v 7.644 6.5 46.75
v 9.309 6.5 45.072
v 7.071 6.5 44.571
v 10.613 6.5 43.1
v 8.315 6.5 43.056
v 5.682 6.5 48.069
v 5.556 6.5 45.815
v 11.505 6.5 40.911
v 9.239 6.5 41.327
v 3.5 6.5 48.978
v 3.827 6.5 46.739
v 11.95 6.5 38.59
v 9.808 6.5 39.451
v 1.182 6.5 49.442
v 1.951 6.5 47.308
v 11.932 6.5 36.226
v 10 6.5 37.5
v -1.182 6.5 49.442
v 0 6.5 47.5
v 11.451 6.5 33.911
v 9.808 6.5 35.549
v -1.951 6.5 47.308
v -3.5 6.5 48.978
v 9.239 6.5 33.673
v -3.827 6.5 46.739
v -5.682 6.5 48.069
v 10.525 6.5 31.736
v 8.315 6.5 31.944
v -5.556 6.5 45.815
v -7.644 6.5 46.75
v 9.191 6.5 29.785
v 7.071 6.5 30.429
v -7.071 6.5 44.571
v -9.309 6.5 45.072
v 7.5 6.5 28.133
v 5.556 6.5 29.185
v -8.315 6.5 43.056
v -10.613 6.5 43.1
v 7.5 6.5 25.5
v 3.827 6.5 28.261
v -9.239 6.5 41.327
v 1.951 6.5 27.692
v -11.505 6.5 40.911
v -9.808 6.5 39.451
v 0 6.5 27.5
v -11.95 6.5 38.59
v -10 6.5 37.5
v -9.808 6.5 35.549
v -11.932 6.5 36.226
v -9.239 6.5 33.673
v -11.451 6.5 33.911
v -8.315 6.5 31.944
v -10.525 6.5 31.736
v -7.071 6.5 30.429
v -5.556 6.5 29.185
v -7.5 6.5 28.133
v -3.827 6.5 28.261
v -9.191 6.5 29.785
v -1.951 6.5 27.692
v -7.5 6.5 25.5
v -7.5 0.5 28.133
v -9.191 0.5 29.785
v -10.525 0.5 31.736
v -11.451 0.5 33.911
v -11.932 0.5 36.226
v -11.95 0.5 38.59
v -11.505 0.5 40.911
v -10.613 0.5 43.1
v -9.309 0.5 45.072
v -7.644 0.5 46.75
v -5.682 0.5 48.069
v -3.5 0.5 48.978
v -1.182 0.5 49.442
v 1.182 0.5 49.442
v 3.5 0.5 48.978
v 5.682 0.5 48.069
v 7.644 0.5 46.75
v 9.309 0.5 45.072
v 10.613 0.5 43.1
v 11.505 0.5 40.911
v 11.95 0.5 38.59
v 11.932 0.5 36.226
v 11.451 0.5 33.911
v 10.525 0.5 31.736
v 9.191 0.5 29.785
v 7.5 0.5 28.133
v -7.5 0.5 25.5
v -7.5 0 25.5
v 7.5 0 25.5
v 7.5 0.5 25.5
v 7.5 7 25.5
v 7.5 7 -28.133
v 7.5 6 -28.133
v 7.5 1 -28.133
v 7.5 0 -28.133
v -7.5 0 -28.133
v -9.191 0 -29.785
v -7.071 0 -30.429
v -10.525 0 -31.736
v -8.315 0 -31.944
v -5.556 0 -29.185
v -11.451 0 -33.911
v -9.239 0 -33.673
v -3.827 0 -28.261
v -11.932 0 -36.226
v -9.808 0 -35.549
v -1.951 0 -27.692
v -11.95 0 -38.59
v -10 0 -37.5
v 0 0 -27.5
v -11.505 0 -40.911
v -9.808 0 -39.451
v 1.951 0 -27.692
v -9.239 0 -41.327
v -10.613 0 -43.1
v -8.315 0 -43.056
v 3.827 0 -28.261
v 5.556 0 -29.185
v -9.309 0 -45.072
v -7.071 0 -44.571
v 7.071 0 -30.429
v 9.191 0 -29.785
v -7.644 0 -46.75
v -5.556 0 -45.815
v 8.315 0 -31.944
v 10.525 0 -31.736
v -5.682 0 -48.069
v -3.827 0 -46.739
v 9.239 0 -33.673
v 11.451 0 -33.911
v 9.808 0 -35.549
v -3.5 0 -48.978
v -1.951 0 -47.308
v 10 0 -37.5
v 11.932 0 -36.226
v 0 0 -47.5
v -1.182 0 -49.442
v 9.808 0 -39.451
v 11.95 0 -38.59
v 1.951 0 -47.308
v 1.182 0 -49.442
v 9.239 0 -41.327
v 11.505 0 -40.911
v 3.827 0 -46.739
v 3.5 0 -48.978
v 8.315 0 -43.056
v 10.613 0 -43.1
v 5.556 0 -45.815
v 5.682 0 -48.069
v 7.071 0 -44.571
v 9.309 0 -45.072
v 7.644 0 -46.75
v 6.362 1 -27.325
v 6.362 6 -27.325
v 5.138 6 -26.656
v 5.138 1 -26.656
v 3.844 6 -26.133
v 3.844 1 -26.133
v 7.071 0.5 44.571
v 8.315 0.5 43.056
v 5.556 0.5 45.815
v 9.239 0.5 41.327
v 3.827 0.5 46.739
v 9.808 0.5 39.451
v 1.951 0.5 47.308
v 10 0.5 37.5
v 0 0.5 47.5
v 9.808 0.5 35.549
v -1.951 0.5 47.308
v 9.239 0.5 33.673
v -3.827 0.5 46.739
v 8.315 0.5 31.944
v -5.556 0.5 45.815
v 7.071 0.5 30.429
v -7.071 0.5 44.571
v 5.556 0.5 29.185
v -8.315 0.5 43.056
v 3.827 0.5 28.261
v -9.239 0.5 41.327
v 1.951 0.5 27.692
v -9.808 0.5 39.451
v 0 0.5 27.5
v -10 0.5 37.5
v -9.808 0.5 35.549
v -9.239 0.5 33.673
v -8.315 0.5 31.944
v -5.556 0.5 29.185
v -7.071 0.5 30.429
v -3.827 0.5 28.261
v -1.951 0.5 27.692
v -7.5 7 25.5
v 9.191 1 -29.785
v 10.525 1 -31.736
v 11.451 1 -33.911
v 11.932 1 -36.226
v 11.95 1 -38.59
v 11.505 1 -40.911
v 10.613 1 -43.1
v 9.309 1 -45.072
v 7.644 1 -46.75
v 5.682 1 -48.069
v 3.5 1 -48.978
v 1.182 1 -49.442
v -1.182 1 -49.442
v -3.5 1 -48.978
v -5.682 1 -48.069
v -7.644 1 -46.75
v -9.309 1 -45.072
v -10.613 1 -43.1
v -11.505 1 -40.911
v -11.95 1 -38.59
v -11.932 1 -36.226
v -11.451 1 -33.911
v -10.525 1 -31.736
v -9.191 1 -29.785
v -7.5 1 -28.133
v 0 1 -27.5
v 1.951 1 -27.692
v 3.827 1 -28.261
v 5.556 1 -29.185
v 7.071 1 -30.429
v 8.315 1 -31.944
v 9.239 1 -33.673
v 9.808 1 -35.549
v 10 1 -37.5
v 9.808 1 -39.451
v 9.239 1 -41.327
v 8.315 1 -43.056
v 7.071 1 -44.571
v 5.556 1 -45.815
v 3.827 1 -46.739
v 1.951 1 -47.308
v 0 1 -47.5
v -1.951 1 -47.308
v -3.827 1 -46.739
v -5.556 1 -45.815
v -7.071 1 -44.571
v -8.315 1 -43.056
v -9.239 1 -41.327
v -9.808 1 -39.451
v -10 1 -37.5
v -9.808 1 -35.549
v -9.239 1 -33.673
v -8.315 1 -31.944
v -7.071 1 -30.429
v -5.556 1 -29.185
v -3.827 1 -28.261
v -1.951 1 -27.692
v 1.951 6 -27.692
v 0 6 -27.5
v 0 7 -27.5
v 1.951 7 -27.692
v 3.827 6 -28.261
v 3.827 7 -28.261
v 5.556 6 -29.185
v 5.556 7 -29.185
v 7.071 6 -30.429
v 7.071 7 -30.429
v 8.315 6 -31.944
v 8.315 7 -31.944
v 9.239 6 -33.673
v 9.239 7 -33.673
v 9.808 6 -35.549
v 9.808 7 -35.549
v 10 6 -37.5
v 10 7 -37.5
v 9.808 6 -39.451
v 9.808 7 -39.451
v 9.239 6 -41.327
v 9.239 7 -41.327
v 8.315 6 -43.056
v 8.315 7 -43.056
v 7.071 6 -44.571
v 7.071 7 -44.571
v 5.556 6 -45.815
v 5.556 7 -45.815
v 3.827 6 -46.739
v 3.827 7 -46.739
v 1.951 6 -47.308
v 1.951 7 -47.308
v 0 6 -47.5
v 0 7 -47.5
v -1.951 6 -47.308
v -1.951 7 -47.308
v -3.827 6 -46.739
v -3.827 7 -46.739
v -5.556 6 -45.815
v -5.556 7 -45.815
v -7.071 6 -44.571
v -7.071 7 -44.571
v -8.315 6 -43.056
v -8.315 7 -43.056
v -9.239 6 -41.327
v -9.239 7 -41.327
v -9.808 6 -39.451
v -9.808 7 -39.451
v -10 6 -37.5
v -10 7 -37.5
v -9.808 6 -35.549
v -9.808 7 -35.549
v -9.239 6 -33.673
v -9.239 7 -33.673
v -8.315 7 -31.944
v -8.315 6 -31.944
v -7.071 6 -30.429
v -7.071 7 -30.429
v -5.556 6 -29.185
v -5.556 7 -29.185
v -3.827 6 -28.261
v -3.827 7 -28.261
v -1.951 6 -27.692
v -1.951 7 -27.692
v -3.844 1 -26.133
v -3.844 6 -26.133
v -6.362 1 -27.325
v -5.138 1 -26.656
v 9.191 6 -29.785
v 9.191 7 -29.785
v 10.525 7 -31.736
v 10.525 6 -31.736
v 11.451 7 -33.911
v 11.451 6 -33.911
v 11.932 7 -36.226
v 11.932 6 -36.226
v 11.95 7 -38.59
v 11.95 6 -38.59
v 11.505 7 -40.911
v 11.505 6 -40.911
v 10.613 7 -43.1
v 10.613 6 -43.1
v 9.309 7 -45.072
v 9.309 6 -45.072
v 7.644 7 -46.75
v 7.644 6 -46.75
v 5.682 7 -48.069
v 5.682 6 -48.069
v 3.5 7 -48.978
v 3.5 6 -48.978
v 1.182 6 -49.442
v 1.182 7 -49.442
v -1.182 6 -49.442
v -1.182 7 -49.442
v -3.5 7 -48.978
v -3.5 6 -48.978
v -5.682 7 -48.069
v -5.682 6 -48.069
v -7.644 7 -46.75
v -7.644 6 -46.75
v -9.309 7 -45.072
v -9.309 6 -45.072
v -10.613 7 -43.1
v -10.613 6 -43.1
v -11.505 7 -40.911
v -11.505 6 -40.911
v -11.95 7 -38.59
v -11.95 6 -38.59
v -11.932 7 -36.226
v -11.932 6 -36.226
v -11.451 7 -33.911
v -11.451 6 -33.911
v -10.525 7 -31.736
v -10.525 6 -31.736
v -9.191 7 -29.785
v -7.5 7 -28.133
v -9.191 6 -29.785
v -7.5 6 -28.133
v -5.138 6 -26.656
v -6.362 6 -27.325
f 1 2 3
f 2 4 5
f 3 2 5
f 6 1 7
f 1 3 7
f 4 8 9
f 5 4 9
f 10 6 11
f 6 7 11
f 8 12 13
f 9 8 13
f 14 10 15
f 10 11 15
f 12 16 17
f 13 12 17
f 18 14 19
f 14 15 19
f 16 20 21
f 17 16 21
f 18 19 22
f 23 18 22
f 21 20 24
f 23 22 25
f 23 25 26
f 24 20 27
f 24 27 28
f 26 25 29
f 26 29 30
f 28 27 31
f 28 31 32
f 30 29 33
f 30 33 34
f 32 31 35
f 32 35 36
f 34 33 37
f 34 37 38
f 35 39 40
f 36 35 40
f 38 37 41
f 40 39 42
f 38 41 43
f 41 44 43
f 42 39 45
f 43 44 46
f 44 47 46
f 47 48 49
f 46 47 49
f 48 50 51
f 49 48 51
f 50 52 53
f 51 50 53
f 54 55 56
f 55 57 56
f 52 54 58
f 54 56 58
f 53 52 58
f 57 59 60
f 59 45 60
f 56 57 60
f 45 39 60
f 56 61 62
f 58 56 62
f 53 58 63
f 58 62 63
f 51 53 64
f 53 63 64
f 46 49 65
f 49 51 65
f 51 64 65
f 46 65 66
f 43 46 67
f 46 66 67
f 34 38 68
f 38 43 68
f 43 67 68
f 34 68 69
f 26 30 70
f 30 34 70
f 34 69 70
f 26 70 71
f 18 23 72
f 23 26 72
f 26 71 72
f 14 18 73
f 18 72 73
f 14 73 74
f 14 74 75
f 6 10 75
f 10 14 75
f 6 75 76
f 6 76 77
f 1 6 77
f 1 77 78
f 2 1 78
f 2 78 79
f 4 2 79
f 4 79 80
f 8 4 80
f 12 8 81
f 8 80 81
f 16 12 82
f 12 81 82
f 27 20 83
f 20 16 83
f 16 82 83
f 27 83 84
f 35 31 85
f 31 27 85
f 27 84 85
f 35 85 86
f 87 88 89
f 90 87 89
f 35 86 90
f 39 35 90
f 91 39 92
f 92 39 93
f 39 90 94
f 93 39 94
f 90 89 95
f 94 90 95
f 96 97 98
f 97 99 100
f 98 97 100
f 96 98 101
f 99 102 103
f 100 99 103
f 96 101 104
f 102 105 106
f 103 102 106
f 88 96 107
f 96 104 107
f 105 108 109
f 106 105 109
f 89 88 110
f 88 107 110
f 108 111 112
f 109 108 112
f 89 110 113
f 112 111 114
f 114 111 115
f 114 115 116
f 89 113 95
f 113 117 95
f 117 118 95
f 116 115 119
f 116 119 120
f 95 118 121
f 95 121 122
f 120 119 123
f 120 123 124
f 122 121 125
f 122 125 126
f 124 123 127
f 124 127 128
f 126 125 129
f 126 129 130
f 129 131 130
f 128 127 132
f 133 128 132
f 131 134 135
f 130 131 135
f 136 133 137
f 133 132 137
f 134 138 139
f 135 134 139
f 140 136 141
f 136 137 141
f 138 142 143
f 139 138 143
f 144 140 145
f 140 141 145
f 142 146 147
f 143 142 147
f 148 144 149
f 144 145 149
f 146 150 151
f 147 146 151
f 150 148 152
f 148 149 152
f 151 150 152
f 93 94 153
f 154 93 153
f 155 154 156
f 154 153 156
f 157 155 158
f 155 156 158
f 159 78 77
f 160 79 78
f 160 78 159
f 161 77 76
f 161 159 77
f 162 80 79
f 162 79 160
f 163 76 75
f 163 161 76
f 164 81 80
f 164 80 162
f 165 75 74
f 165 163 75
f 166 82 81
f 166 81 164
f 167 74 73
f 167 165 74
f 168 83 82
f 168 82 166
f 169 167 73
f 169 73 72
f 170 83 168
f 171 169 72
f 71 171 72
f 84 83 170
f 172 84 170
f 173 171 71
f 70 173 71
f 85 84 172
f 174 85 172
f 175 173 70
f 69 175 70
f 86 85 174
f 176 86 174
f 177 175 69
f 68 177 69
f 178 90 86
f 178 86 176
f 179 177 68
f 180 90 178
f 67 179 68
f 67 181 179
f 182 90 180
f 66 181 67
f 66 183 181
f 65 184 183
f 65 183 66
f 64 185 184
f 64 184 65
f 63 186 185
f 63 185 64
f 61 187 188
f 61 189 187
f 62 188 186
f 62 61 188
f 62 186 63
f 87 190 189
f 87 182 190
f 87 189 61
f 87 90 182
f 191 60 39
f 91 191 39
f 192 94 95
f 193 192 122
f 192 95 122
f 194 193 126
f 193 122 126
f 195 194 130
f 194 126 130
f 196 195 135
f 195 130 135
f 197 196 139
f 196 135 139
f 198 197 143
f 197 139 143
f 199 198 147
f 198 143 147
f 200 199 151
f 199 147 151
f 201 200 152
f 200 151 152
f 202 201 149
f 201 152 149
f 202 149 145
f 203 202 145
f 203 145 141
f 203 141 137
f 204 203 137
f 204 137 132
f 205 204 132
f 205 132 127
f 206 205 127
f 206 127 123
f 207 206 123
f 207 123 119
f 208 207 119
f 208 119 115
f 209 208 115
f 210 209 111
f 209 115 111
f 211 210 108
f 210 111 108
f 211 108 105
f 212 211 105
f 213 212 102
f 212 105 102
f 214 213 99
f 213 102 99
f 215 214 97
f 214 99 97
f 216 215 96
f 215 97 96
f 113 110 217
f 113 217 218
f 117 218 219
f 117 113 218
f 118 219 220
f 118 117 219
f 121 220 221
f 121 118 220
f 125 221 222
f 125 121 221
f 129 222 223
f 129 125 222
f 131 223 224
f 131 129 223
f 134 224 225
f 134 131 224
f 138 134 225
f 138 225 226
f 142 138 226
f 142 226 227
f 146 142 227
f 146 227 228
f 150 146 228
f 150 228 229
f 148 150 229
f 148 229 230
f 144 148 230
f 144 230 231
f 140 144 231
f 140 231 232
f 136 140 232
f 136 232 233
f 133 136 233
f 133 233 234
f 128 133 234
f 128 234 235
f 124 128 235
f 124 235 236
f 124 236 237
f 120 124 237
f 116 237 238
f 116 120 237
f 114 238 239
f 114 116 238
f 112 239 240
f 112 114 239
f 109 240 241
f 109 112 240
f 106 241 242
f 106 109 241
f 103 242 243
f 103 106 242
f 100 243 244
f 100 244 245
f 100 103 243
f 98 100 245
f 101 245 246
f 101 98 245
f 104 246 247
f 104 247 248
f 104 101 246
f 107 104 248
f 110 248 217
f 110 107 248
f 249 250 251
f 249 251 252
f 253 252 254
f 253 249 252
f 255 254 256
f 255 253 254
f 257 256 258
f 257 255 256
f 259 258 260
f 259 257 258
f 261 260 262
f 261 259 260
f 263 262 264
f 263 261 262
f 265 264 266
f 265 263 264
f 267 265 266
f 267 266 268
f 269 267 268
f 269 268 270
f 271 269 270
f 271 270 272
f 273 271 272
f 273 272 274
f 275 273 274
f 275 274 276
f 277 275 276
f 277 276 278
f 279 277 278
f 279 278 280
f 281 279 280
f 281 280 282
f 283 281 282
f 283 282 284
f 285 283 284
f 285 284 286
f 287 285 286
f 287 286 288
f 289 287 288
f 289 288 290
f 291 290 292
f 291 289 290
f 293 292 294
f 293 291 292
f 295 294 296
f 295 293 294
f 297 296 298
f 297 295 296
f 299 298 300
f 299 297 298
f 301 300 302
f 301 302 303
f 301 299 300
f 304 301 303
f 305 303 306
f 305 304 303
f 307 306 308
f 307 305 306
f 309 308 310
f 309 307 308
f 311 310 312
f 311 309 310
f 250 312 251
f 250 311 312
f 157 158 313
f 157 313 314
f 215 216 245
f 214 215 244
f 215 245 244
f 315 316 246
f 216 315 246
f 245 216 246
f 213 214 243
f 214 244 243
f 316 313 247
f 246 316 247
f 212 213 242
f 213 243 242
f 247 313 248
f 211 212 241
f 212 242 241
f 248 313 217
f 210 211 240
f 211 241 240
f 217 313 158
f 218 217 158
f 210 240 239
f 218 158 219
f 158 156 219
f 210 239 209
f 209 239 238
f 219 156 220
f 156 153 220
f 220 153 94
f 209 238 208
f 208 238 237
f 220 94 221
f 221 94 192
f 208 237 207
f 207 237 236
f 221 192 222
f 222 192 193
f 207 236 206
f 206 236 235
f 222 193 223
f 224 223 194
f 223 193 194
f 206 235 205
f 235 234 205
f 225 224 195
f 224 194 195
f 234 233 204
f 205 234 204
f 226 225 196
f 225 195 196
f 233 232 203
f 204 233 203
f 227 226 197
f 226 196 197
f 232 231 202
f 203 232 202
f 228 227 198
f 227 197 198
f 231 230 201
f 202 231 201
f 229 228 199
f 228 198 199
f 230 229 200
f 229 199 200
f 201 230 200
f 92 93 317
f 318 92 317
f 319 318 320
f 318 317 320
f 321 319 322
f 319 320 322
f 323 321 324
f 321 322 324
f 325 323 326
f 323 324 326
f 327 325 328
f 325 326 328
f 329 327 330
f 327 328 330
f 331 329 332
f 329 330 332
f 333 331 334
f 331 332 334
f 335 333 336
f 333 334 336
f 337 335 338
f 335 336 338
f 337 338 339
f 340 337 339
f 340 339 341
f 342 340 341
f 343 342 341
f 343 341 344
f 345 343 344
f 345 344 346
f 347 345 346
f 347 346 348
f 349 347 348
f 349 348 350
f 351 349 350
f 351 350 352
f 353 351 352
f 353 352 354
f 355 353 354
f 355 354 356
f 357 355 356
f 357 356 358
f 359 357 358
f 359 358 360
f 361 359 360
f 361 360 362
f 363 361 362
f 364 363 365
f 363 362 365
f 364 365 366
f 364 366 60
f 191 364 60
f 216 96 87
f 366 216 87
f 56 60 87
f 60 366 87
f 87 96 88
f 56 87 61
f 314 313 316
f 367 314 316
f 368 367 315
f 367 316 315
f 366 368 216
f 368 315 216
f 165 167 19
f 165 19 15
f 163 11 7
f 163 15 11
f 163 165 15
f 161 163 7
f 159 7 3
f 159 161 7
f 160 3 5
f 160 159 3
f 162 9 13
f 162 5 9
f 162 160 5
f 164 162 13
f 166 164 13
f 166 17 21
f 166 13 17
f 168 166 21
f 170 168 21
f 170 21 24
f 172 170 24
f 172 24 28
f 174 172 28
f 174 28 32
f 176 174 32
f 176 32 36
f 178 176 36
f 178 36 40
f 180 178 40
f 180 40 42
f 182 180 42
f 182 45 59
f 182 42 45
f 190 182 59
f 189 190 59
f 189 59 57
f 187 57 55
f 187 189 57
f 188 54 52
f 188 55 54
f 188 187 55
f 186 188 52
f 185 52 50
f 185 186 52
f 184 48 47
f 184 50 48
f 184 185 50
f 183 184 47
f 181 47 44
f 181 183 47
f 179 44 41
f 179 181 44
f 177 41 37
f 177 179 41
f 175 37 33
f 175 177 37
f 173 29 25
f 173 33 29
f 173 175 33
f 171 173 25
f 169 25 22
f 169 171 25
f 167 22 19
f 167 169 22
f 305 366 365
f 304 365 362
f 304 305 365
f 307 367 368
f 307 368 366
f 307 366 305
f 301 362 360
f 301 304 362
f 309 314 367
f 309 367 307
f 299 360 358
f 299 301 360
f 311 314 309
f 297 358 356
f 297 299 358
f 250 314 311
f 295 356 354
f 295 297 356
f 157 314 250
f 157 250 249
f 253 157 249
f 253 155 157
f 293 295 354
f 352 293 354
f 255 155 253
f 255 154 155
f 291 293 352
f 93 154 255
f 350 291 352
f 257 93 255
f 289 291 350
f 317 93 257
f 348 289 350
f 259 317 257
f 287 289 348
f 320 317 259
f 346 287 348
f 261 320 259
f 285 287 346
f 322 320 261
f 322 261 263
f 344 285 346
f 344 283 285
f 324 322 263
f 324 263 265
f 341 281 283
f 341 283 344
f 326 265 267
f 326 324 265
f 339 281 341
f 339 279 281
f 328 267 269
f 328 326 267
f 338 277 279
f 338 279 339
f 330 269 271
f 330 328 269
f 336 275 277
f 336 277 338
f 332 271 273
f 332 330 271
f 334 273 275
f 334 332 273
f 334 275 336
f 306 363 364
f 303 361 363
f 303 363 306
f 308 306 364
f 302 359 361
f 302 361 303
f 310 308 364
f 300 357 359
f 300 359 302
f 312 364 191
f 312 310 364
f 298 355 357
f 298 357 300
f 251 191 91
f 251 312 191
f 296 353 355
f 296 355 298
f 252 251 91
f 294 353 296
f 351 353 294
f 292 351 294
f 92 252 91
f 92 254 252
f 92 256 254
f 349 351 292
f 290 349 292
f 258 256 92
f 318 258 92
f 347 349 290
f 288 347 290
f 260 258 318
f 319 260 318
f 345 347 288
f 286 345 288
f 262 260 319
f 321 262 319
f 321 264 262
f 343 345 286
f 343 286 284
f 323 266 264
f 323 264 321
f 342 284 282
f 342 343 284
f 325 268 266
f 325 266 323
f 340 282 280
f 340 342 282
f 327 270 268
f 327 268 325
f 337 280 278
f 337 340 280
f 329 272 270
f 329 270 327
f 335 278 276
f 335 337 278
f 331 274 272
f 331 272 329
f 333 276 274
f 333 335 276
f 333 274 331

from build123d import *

# Parameters (mm, degrees)
PROFILE_SKETCH_R                  = 10
PROFILE_EXTRUDE_DEPTH             = 7
UPPER_WRIST_CUT_DEPTH             = 0.5
LOWER_START                       = 6.5
LOWER_WRIST_CUT_DEPTH             = 0.5
FINGER_CUT_REACH                  = 53.413
FINGER_CUT_END_RADIUS             = 12
FINGER_CUT_SKETCH_W               = 23.367496998
FINGER_CUT_SKETCH_H               = 5
FINGER_CUT_DIRECTION_2_REACH      = 53.413
FINGER_CUT_DIRECTION_2_END_RADIUS = 12


with BuildPart() as part:
    # Profile Sketch → Profile Extrude (new body)
    with BuildSketch(Plane(origin=(0, 0, 0), x_dir=(1, 0, 0), z_dir=(0, 1, 0))):
        with BuildLine():
            Line((-7.5, 28.132503002), (-7.5, -28.132503002))
            ThreePointArc((-7.5, -28.132503002), (0, -49.5), (7.5, -28.132503002))
            Line((7.5, -28.132503002), (7.5, 28.132503002))
            ThreePointArc((7.5, 28.132503002), (0, 49.5), (-7.5, 28.132503002))
        make_face()
        with Locations(Location((0, -37.5, 0), (0, 0, 270))):
            Circle(PROFILE_SKETCH_R, mode=Mode.SUBTRACT)
        with Locations(Location((0, 37.5, 0), (0, 0, 270))):
            Circle(PROFILE_SKETCH_R, mode=Mode.SUBTRACT)
    extrude(amount=PROFILE_EXTRUDE_DEPTH)

    # Wrist Cut Sketch → Upper Wrist Cut (cut)
    with BuildSketch(Plane(origin=(0, 0, 0), x_dir=(1, 0, 0), z_dir=(0, 1, 0))):
        with BuildLine():
            Line((-7.5, -28.132503002), (-7.5, -25.5))
            Line((-7.5, -25.5), (7.5, -25.5))
            Line((7.5, -25.5), (7.5, -28.132503002))
            ThreePointArc((7.5, -28.132503002), (0, -49.5), (-7.5, -28.132503002))
        make_face()
    extrude(amount=UPPER_WRIST_CUT_DEPTH, mode=Mode.SUBTRACT)

    # Sketch2<2> → Lower Wrist Cut (cut)
    with BuildSketch(Plane(origin=(0, 0, 0), x_dir=(1, 0, 0), z_dir=(0, 1, 0)).offset(LOWER_START)):
        with BuildLine():
            Line((-7.5, -28.132503002), (-7.5, -25.5))
            Line((-7.5, -25.5), (7.5, -25.5))
            Line((7.5, -25.5), (7.5, -28.132503002))
            ThreePointArc((7.5, -28.132503002), (0, -49.5), (-7.5, -28.132503002))
        make_face()
    extrude(amount=LOWER_WRIST_CUT_DEPTH, mode=Mode.SUBTRACT)

    # Finger Cut: up to this cylinder (the profile starts inside it)
    finger_cut_end = Plane(origin=(0, 3.5, -37.5), z_dir=(0, -1, 0)) * Cylinder(FINGER_CUT_END_RADIUS, 131.826, mode=Mode.PRIVATE)
    # Finger Cut Sketch → Finger Cut (cut, up to the surface)
    with BuildSketch(Plane(origin=(0, 0, 0), x_dir=(0, 0, -1), z_dir=(1, 0, 0)), mode=Mode.PRIVATE) as finger_cut_sk1:
        with Locations((37.816251501, 3.5)):
            Rectangle(FINGER_CUT_SKETCH_W, FINGER_CUT_SKETCH_H)
    finger_cut_tool1 = extrude(finger_cut_sk1.sketch, amount=-FINGER_CUT_REACH, mode=Mode.PRIVATE) & finger_cut_end
    add(finger_cut_tool1.solids().sort_by_distance((0, 3.5, -37.816252))[0], mode=Mode.SUBTRACT)

    # Finger Cut direction 2: up to this cylinder (the profile starts inside it)
    finger_cut_direction_2_end = Plane(origin=(0, 3.5, -37.5), z_dir=(0, -1, 0)) * Cylinder(FINGER_CUT_DIRECTION_2_END_RADIUS, 131.826, mode=Mode.PRIVATE)
    # Finger Cut Sketch → Finger Cut direction 2 (cut, up to the surface)
    with BuildSketch(Plane(origin=(0, 0, 0), x_dir=(0, 0, -1), z_dir=(1, 0, 0)), mode=Mode.PRIVATE) as finger_cut_direction_2_sk1:
        with Locations((37.816251501, 3.5)):
            Rectangle(FINGER_CUT_SKETCH_W, FINGER_CUT_SKETCH_H)
    finger_cut_direction_2_tool1 = extrude(finger_cut_direction_2_sk1.sketch, amount=FINGER_CUT_DIRECTION_2_REACH, mode=Mode.PRIVATE) & finger_cut_direction_2_end
    add(finger_cut_direction_2_tool1.solids().sort_by_distance((0, 3.5, -37.816252))[0], mode=Mode.SUBTRACT)


solid = part.part
